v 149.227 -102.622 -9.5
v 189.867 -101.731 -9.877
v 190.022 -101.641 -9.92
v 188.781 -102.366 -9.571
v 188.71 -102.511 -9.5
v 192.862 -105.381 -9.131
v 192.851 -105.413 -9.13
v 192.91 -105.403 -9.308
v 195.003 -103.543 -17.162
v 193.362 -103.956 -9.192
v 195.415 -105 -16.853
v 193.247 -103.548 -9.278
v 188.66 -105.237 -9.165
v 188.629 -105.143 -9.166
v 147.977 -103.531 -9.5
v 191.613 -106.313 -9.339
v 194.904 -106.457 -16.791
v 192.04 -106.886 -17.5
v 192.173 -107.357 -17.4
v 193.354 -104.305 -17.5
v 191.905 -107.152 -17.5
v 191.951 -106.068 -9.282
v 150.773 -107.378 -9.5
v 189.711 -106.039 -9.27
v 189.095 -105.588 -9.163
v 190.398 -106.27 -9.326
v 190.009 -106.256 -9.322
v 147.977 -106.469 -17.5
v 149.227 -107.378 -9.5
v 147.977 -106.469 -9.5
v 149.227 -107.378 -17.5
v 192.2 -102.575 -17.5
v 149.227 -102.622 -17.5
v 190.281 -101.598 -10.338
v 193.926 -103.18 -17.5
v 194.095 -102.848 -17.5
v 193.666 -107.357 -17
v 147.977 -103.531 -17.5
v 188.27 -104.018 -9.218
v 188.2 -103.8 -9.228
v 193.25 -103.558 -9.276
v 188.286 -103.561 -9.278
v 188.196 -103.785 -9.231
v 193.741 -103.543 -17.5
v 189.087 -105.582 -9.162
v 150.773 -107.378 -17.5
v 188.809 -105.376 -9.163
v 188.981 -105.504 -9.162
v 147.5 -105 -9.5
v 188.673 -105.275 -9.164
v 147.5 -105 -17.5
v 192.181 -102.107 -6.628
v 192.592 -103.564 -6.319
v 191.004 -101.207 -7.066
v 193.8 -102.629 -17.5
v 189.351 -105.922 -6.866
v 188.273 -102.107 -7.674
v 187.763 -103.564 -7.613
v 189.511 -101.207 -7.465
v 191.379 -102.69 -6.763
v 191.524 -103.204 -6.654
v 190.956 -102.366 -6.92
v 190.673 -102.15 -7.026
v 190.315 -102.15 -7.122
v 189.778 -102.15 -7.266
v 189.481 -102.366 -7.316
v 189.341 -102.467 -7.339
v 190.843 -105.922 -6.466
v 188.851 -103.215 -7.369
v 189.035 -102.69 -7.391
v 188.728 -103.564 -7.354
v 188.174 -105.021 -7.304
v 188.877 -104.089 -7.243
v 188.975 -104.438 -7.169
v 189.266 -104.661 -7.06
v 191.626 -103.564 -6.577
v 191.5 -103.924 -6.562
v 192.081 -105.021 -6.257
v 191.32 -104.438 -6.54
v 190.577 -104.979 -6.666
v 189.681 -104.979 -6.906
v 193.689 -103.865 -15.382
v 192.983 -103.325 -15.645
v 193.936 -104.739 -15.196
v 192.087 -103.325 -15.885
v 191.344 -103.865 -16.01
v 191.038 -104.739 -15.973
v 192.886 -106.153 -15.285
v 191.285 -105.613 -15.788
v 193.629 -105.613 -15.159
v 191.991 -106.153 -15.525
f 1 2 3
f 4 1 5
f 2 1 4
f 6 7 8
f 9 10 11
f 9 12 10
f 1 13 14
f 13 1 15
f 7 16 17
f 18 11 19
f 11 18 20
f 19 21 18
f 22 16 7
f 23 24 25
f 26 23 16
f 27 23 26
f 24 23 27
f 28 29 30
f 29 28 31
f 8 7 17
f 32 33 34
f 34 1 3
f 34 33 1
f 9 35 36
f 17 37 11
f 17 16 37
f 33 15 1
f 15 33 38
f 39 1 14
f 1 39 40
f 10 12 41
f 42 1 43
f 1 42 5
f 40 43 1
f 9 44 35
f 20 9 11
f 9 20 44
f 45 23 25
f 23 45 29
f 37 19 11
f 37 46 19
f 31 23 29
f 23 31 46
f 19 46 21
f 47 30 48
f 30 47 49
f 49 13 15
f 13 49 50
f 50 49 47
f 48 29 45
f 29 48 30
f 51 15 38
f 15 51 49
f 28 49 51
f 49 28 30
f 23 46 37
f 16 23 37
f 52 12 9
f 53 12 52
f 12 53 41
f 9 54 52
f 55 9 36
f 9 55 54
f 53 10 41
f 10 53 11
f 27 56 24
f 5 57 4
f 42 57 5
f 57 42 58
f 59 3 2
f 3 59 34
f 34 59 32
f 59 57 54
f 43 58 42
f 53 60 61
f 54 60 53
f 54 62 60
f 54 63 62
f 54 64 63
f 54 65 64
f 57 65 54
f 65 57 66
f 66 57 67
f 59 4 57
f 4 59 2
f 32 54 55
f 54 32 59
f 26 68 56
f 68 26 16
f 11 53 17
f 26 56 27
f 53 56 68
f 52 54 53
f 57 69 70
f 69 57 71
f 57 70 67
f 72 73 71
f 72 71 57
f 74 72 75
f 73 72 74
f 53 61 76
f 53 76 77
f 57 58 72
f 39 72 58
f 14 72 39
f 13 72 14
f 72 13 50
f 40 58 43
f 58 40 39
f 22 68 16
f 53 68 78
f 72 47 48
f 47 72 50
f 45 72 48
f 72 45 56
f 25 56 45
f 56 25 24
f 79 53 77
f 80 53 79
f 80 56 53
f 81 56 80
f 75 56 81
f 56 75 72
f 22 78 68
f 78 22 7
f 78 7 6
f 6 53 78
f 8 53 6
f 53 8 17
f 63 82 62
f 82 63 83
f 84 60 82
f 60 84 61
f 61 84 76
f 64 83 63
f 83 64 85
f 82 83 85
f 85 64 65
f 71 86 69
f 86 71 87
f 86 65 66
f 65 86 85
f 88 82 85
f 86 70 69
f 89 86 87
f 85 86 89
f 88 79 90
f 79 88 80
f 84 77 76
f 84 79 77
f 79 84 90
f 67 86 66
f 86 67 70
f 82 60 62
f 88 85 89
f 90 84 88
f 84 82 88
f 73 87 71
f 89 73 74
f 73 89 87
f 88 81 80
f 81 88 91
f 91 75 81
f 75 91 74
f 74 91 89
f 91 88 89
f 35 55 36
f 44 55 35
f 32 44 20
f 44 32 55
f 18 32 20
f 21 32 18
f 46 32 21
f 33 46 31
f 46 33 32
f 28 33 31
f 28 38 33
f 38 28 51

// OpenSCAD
$fn=10;

// The profile is 19.5 in height and 6mm in width
profile_height=17.5;
profile_width=6;

// Keep at 10 for developping, 100 for rendering 
fn_base=10;

// Geometric Parameters   
profile_added_offset=1.5;
plastic_thickness=1.5;
pcb_top_clearance=5.7;
pcb_bottom_clearance=4;
pcb_thickness=1.6;
//The PCB needs a 7.5mm clearance from the top interior of the shell
pcb_depth=pcb_top_clearance+pcb_thickness;

module body(offset=0,fn_body,target_curve){
    //building the body by sliding the profile around
    minkowski() {
            linear_extrude(height = 0.001, center = false, convexity = 20)offset(r=offset-profile_width)import(file = "./DXF/MiniChord-User_front_plate_outline.dxf",$fn=fn_body*3);
            rotate_extrude()import(file = target_curve,$fn=fn_body/2);
        }
}


difference(){
    union(){
        //Making the shell
        difference(){
            //full shape
            union(){
                body(profile_added_offset,fn_base,"./DXF/MiniChord-User_edge_curve.dxf");
                union(){
                 hull(){
                     //angle initial:20°
                     //angle coté holder:15°
                    translate([193,-105,-17.5])rotate([-7.5,-15,0])cylinder(h=8,d=5);
                    translate([150,-105,-17.5])cylinder(h=8,d=5);
                   }
                    translate([193,-105,-17.5])rotate([-7.5,-15,0])cylinder(h=11,d=5);
                }
            }
            translate([193,-105,-17.5])rotate([-7.5,-15,0])translate([0,0,2])cylinder(h=15,d=3);
     translate([0,-1000,-22.5])cube([1000,1000,5]);


            //minus the top shape 
            body(profile_added_offset,fn_base,"./DXF/MiniChord-User_bottom_edge_curve.dxf");
            //emptying the interior, 2mm bottom thickness
            translate([0,0,plastic_thickness])body(-3,fn_base,"./DXF/MiniChord-User_edge_curve.dxf");
            //removing the reset zone 
            translate([0,0,-profile_height])linear_extrude(height = profile_height, center = false, convexity = 20)import (file = "./DXF/MiniChord-User_reset_zone.dxf",$fn=3*fn_base); 
            
            
            
        }
        //Adding the PCB support
        intersection(){
            difference(){
                //full shape
                body(profile_added_offset,fn_base,"./DXF/MiniChord-User_edge_curve.dxf");
                //minus the top shape
                body(profile_added_offset,fn_base,"./DXF/MiniChord-User_bottom_edge_curve.dxf");
            }
            //intersecting with the PCB support profile
            translate([0,0,-(profile_height)])linear_extrude(height =profile_height, center = false, convexity = 20)import (file = "./DXF/MiniChord-User_pcb_support.dxf",$fn=fn_base); 
        }
        //adding the reset internal cover
        difference(){
            translate([0,0,-profile_height])linear_extrude(height = profile_height-pcb_depth-plastic_thickness, center = false, convexity = 20)offset(r=1)import (file = "./DXF/MiniChord-User_reset_zone.dxf",$fn=3*fn_base); //removing the reset zone 
            translate([0,0,-profile_height])linear_extrude(height = profile_height, center = false, convexity = 20)import (file = "./DXF/MiniChord-User_reset_zone.dxf",$fn=3*fn_base); 
        }
        //adding the battery holder
         translate([0,0,-profile_height])linear_extrude(height = 3+plastic_thickness, center = false, convexity = 20)import (file = "./DXF/MiniChord-User_battery_holder.dxf",$fn=fn_base); 
        /*translate([0,0,-profile_height+plastic_thickness+3])
        roof(method="straight", convexity = 10){
             import (file = "./DXF/MiniChord-User_battery_holder.dxf",$fn=fn_base);
        }*/
        
        
    }

    //>>the PCB cut
    //Let's cut the PCB  
    translate([0,0,-plastic_thickness-pcb_depth])linear_extrude(height = pcb_depth+plastic_thickness, center = false, convexity = 20)offset(r=0.1)import (file = "./DXF/MiniChord-Edge_Cuts.dxf",$fn=3*fn_base); 
    
    //>>The bottom clearance cut
    //We need to make room 
    added_depth=pcb_bottom_clearance+pcb_depth;
    translate([0,0,-plastic_thickness-added_depth])linear_extrude(height = added_depth+plastic_thickness, center = false, convexity = 20)offset(r=0.00)import (file = "./DXF/MiniChord-User_pcb_low_clear.dxf",$fn=fn_base/2); 
    
   
   //cut for connector
    connector_center_z=-plastic_thickness-pcb_top_clearance+1.45;
    height_connector_housing=6;
    height_connector=3;

     minkowski(){
         radius_connector=0.75;
         translate([0,0,connector_center_z-height_connector/2+radius_connector])linear_extrude(height =height_connector-2*radius_connector, center = false, convexity = 20)offset(r=-radius_connector)import (file = "./DXF/MiniChord-User_pcb_usb_connector.dxf");
          sphere(r=radius_connector,$fn=fn_base);
     }
     minkowski(){
    translate([0,0,connector_center_z-height_connector_housing/2])linear_extrude(height =height_connector_housing+1, center = false, convexity = 20)offset(r=-0.5)import (file = "./DXF/MiniChord-User_pcb_usb_housing.dxf"); 
   sphere(r=0.5,$fn=fn_base);
    }
    
    //cut for headphone
    //unfortunaly I have to do it manually, centered on the middle of the end of connector
    headphone_x=101.4452;
    headphone_y=-143.9548;
    headphone_center_z=-plastic_thickness-pcb_top_clearance+2.7;
    //connector
    translate([headphone_x,headphone_y,headphone_center_z])rotate([0,0,-45]){
    translate([0,3,0])rotate([90,0,0])cylinder(d=6.4,h=200,$fn=2*fn_base);
    translate([0,3,0])rotate([90,0,0])cylinder(d=8,h=1.7,$fn=2*fn_base);
    translate([0,5,0])rotate([90,0,0])cylinder(d=8,h=3,$fn=2*fn_base);
    translate([0,2+5,0])cube([12,10,5],center=true);
    }
    
    
    //the screw hole cut, we offset the plate cutout to get them
    real_screw_d=3;
    target_screw_head=4.6;
    target_screw_body=2.9;

    additional_depth=20;
     translate([0,0,-profile_height])linear_extrude(height =profile_height, center = false, convexity = 20)offset(r=(target_screw_body-real_screw_d)/2)import(file = "./DXF/MiniChord-User_holes_housing.dxf",$fn=fn_base); 
    //let's stop 1mm before the pcb clearance
    translate([0,0,-profile_height])linear_extrude(height =profile_height-(plastic_thickness+pcb_depth)-1, center = false, convexity = 20)offset(r=(target_screw_head-real_screw_d)/2)import(file = "./DXF/MiniChord-User_holes_housing.dxf",$fn=fn_base); 
    
   
    
}
